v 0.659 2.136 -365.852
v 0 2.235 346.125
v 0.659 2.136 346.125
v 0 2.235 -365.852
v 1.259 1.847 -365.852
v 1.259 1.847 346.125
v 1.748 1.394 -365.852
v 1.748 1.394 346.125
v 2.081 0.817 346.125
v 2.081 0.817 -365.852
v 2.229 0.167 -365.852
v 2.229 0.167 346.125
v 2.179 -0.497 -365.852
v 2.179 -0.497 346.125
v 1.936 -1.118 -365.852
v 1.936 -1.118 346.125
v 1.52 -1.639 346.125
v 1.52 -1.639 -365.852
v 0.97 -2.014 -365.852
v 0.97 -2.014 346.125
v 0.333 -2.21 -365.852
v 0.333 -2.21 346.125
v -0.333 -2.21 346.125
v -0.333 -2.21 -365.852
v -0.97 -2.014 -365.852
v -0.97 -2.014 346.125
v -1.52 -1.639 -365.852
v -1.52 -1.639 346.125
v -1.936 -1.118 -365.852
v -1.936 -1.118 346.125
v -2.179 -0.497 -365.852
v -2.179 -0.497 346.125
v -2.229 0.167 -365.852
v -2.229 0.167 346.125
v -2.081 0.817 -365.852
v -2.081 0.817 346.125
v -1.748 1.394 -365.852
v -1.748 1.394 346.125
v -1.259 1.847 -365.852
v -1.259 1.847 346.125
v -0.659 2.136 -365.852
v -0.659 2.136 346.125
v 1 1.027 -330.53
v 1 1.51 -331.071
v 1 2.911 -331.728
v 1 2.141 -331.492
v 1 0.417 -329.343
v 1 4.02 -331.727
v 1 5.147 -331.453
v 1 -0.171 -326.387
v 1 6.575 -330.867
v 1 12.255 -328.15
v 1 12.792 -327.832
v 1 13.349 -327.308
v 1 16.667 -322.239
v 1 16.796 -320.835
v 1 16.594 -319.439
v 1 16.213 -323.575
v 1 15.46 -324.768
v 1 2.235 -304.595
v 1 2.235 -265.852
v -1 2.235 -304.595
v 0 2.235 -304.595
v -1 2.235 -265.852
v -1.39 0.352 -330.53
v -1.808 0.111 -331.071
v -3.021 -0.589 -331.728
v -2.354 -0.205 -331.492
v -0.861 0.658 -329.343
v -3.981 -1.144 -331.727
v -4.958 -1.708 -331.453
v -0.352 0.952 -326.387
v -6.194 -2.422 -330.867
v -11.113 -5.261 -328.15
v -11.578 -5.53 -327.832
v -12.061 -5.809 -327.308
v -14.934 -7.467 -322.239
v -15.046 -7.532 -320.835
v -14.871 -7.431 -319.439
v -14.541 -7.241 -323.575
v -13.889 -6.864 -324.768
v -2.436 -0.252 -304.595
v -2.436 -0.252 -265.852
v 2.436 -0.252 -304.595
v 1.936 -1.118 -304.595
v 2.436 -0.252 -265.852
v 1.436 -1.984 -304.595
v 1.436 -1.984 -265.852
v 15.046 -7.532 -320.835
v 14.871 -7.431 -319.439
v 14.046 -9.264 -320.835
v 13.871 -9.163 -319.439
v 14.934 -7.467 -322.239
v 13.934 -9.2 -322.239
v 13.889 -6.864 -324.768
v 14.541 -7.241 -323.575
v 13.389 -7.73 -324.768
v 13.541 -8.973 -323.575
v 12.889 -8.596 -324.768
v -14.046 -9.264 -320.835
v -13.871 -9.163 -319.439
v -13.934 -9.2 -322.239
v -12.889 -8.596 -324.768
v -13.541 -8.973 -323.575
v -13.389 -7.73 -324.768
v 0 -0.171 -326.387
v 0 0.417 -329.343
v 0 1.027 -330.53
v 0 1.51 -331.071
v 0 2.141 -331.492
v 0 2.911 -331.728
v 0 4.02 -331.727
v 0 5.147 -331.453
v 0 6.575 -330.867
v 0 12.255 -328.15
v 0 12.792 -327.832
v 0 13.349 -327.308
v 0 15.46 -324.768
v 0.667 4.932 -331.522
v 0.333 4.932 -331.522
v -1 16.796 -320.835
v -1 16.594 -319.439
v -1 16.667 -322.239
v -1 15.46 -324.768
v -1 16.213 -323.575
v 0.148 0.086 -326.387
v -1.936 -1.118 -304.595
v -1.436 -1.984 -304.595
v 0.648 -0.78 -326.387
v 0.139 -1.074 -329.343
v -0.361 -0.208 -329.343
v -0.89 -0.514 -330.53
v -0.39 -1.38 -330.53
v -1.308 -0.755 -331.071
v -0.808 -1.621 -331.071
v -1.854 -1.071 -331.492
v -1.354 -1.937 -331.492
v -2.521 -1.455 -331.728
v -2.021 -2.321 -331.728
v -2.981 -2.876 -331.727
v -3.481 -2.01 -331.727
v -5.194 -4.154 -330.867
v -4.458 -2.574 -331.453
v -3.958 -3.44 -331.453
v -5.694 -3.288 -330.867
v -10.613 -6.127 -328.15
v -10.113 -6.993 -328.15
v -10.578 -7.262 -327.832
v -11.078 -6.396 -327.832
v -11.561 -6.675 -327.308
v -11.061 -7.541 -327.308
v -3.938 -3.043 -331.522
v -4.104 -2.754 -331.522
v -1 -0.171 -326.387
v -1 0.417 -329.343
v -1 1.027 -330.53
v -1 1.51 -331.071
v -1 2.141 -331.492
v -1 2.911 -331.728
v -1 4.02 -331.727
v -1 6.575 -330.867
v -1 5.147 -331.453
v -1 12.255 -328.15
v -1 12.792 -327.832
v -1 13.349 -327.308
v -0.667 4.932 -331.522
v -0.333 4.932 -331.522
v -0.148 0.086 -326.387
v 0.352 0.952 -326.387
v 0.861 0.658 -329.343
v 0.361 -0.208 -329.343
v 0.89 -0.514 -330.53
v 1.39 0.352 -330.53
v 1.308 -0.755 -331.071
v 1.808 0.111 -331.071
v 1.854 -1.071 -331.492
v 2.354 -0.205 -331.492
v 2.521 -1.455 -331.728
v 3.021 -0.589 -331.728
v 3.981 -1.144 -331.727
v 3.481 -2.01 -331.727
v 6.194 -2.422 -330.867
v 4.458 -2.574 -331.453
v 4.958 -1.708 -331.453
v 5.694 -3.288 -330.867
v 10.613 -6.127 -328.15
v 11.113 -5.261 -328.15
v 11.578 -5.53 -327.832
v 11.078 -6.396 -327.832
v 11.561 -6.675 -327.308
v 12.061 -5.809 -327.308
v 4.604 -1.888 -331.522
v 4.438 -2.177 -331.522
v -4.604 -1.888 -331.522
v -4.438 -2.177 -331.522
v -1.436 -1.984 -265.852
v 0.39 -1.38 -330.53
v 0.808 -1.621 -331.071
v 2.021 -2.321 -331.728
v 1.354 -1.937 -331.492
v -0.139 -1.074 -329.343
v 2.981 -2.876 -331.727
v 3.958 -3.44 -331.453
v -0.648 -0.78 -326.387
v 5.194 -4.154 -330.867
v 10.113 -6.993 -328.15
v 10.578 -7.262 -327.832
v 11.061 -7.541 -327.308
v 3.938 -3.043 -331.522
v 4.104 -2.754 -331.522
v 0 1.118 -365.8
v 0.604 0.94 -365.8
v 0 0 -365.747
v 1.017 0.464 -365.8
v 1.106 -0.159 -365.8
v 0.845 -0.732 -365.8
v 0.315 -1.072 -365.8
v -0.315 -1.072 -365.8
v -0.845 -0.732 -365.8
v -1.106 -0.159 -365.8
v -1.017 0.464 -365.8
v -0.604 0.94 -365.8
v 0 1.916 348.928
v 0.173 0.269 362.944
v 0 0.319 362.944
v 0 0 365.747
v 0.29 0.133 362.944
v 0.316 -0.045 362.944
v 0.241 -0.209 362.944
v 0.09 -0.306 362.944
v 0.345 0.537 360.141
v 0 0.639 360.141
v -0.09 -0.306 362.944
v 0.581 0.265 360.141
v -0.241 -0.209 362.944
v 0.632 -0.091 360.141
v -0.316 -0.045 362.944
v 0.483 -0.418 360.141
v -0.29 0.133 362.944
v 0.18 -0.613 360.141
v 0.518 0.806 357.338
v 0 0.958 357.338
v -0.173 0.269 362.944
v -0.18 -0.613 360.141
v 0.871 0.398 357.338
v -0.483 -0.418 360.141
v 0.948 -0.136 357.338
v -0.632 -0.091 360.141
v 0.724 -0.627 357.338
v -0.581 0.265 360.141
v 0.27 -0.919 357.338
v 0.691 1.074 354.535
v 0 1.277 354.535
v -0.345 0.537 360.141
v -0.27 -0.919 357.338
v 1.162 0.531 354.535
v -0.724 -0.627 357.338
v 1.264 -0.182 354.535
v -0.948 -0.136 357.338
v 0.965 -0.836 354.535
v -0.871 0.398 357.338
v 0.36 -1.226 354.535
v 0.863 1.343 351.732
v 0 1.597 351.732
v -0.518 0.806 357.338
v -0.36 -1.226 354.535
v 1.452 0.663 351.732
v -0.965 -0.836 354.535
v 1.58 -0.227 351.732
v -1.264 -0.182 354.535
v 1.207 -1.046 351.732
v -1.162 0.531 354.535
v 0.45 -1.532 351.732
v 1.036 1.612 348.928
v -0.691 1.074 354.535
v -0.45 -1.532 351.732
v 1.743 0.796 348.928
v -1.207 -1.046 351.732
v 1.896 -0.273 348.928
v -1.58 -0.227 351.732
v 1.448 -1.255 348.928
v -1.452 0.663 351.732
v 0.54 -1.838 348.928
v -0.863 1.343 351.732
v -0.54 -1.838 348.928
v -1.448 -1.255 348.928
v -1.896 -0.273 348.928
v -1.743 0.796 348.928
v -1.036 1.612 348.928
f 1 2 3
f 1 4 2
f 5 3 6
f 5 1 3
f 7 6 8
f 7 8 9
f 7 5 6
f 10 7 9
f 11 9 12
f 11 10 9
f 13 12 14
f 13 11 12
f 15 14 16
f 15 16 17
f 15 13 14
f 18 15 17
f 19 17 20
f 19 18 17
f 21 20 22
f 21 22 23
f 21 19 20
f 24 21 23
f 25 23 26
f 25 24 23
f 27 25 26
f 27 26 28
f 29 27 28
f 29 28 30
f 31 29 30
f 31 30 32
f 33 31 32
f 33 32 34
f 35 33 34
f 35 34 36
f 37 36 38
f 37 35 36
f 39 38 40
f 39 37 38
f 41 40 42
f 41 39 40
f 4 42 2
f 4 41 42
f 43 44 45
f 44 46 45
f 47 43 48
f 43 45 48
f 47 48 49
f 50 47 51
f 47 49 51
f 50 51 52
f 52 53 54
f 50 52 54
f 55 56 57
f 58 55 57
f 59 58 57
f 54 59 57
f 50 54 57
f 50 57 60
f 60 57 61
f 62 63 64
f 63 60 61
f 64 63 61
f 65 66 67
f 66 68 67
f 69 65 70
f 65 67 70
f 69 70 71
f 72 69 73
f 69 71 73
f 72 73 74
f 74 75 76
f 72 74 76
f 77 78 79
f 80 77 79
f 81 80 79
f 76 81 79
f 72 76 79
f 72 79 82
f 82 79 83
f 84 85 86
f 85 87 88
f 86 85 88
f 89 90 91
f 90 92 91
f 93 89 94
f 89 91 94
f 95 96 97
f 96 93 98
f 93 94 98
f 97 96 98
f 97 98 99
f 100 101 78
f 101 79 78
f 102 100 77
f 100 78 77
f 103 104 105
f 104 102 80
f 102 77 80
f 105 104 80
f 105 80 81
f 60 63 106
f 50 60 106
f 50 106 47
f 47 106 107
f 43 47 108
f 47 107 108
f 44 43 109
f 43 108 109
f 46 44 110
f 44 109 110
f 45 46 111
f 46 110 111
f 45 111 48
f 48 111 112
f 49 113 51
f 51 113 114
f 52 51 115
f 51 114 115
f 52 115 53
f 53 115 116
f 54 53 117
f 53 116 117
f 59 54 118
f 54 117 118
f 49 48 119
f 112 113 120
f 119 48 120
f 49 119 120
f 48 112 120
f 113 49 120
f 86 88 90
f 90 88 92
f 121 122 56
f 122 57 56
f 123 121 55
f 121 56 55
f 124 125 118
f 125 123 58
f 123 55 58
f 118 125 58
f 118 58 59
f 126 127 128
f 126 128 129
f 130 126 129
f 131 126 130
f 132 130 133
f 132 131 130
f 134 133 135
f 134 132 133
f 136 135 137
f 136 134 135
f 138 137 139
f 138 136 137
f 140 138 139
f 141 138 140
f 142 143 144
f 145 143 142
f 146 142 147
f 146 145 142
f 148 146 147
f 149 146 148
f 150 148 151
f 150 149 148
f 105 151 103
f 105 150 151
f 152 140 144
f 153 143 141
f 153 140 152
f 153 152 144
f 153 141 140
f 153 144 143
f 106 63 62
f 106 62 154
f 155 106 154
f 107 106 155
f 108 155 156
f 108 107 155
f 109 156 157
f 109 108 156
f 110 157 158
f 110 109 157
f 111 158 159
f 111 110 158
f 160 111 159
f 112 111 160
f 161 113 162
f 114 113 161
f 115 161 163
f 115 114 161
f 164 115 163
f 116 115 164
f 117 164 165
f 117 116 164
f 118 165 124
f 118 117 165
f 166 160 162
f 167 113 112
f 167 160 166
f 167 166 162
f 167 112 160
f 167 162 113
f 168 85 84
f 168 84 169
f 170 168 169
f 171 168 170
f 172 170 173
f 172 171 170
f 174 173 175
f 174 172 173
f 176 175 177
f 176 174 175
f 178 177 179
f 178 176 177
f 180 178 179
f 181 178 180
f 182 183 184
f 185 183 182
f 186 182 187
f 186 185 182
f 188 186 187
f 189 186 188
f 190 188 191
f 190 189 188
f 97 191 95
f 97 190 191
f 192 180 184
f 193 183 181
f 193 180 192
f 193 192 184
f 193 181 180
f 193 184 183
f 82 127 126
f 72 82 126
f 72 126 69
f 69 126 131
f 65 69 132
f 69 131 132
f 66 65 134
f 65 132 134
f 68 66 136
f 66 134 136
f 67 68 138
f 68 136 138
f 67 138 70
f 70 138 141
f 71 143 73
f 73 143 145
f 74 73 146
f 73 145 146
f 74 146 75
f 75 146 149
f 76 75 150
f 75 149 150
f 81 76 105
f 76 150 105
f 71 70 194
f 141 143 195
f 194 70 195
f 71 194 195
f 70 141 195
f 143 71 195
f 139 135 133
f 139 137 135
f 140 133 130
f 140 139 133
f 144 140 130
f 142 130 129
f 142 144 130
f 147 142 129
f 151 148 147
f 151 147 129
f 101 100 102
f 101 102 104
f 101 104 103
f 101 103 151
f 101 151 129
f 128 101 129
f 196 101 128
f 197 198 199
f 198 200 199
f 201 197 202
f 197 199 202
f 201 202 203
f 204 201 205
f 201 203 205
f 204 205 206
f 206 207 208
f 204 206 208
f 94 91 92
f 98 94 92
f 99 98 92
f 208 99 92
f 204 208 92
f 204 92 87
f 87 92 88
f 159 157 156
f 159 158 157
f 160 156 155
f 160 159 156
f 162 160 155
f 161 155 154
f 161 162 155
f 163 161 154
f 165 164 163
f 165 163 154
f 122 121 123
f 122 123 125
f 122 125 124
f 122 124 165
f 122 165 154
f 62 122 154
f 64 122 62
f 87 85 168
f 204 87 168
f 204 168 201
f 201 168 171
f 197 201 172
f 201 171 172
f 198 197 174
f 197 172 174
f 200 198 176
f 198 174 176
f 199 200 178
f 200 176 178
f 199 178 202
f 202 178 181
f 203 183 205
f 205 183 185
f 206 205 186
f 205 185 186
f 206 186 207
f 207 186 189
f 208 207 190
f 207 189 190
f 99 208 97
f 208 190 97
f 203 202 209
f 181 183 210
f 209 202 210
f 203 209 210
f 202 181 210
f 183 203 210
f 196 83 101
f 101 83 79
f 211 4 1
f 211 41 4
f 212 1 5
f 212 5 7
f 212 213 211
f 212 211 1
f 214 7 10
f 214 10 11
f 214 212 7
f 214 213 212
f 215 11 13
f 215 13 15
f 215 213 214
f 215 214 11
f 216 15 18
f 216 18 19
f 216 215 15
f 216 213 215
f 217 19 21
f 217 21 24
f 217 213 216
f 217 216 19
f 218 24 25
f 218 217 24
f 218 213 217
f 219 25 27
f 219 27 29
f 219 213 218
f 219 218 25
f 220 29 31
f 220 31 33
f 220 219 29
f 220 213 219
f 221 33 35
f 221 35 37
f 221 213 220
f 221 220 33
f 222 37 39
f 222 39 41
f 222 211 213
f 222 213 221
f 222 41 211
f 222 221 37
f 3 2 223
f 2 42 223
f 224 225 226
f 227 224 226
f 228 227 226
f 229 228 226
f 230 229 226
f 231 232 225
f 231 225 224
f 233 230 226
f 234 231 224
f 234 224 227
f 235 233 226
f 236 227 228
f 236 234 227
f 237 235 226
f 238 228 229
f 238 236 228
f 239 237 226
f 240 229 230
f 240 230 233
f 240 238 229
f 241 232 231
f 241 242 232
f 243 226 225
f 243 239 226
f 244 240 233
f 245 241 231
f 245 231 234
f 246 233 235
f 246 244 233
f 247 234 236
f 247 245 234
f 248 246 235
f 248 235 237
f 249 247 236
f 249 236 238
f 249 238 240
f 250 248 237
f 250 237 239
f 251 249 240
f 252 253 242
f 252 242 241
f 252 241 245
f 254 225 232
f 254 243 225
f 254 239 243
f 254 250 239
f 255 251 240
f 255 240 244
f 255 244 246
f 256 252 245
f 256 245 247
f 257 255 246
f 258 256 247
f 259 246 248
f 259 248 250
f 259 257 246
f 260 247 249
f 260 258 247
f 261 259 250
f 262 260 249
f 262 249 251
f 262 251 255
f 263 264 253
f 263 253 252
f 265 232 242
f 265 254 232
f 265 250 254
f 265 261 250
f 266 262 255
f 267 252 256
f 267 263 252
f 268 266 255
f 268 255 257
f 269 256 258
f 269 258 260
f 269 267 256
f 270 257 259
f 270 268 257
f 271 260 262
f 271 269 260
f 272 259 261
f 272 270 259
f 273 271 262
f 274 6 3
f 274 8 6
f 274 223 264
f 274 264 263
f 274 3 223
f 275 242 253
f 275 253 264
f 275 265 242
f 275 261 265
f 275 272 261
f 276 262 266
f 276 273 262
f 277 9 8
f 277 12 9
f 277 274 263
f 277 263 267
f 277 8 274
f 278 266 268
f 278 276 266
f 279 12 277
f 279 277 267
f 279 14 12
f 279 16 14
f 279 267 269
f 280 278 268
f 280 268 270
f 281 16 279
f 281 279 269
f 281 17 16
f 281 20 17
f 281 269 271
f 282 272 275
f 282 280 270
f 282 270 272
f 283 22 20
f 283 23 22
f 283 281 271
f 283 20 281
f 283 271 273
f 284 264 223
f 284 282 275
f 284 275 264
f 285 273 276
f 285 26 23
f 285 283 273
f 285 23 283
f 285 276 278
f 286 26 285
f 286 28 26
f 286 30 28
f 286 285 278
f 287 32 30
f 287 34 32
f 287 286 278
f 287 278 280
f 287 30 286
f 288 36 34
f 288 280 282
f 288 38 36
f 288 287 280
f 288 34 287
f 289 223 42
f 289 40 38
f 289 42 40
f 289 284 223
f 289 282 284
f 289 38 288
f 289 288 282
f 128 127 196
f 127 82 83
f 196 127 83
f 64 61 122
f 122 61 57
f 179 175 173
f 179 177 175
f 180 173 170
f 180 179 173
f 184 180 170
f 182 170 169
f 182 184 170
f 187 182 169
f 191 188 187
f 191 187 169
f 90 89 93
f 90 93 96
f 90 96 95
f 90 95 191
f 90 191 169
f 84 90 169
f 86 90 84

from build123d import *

# Parameters (mm, degrees)
BOSS_EXTRUDE1_DEPTH = 1
CIRPATTERN5_COUNT   = 3


with BuildPart() as part:
    # Sketch1 → Revolve1 (revolve)
    with BuildSketch(Plane(origin=(0, 0, 0), x_dir=(0, 0, -1), z_dir=(1, 0, 0))):
        Polygon((-346.125224176, 2.2352), (365.85189849, 2.2352), (365.747378609, 0), (-365.747378609, 0), align=None)
    revolve(axis=Axis((0, 0, 365.747378609), (0, 0, -1)))


with BuildPart() as body_2:
    # Sketch3 → Boss-Extrude1 (new, symmetric)
    with BuildSketch(Plane(origin=(0, 0, 0), x_dir=(0, 0, -1), z_dir=(1, 0, 0))):
        with BuildLine():
            Line((304.595078034, 2.2352), (265.85189849, 2.2352))
            Line((265.85189849, 2.2352), (319.438641364, 16.593724478))
            ThreePointArc((319.438641364, 16.593724478), (322.239457722, 16.666963296), (324.768164309, 15.460489428))
            add(Edge.make_bspline(
                [(304.595078034, 2.2352), (317.618960328, 0.07477359), (336.834434555, -3.698336964), (326.789941802, 13.868265136), (329.183734977, 11.883754495), (324.768164309, 15.460489428)],
                knots=[0, 0, 0, 0, 0.505374178, 0.593785368, 0.884111896, 0.884111896, 0.884111896, 0.884111896], degree=3))
        make_face()
    extrude(amount=BOSS_EXTRUDE1_DEPTH, both=True)


with BuildPart() as cirpattern5_1:
    # CirPattern5: pattern copy
    add(body_2.part.rotate(Axis((0, 0, -365.747378609), (0, 0, -1)), 1 * 360 / CIRPATTERN5_COUNT))


with BuildPart() as cirpattern5_2:
    # CirPattern5: pattern copy
    add(body_2.part.rotate(Axis((0, 0, -365.747378609), (0, 0, -1)), 2 * 360 / CIRPATTERN5_COUNT))


solid = Compound([part.part, body_2.part, cirpattern5_1.part, cirpattern5_2.part])
